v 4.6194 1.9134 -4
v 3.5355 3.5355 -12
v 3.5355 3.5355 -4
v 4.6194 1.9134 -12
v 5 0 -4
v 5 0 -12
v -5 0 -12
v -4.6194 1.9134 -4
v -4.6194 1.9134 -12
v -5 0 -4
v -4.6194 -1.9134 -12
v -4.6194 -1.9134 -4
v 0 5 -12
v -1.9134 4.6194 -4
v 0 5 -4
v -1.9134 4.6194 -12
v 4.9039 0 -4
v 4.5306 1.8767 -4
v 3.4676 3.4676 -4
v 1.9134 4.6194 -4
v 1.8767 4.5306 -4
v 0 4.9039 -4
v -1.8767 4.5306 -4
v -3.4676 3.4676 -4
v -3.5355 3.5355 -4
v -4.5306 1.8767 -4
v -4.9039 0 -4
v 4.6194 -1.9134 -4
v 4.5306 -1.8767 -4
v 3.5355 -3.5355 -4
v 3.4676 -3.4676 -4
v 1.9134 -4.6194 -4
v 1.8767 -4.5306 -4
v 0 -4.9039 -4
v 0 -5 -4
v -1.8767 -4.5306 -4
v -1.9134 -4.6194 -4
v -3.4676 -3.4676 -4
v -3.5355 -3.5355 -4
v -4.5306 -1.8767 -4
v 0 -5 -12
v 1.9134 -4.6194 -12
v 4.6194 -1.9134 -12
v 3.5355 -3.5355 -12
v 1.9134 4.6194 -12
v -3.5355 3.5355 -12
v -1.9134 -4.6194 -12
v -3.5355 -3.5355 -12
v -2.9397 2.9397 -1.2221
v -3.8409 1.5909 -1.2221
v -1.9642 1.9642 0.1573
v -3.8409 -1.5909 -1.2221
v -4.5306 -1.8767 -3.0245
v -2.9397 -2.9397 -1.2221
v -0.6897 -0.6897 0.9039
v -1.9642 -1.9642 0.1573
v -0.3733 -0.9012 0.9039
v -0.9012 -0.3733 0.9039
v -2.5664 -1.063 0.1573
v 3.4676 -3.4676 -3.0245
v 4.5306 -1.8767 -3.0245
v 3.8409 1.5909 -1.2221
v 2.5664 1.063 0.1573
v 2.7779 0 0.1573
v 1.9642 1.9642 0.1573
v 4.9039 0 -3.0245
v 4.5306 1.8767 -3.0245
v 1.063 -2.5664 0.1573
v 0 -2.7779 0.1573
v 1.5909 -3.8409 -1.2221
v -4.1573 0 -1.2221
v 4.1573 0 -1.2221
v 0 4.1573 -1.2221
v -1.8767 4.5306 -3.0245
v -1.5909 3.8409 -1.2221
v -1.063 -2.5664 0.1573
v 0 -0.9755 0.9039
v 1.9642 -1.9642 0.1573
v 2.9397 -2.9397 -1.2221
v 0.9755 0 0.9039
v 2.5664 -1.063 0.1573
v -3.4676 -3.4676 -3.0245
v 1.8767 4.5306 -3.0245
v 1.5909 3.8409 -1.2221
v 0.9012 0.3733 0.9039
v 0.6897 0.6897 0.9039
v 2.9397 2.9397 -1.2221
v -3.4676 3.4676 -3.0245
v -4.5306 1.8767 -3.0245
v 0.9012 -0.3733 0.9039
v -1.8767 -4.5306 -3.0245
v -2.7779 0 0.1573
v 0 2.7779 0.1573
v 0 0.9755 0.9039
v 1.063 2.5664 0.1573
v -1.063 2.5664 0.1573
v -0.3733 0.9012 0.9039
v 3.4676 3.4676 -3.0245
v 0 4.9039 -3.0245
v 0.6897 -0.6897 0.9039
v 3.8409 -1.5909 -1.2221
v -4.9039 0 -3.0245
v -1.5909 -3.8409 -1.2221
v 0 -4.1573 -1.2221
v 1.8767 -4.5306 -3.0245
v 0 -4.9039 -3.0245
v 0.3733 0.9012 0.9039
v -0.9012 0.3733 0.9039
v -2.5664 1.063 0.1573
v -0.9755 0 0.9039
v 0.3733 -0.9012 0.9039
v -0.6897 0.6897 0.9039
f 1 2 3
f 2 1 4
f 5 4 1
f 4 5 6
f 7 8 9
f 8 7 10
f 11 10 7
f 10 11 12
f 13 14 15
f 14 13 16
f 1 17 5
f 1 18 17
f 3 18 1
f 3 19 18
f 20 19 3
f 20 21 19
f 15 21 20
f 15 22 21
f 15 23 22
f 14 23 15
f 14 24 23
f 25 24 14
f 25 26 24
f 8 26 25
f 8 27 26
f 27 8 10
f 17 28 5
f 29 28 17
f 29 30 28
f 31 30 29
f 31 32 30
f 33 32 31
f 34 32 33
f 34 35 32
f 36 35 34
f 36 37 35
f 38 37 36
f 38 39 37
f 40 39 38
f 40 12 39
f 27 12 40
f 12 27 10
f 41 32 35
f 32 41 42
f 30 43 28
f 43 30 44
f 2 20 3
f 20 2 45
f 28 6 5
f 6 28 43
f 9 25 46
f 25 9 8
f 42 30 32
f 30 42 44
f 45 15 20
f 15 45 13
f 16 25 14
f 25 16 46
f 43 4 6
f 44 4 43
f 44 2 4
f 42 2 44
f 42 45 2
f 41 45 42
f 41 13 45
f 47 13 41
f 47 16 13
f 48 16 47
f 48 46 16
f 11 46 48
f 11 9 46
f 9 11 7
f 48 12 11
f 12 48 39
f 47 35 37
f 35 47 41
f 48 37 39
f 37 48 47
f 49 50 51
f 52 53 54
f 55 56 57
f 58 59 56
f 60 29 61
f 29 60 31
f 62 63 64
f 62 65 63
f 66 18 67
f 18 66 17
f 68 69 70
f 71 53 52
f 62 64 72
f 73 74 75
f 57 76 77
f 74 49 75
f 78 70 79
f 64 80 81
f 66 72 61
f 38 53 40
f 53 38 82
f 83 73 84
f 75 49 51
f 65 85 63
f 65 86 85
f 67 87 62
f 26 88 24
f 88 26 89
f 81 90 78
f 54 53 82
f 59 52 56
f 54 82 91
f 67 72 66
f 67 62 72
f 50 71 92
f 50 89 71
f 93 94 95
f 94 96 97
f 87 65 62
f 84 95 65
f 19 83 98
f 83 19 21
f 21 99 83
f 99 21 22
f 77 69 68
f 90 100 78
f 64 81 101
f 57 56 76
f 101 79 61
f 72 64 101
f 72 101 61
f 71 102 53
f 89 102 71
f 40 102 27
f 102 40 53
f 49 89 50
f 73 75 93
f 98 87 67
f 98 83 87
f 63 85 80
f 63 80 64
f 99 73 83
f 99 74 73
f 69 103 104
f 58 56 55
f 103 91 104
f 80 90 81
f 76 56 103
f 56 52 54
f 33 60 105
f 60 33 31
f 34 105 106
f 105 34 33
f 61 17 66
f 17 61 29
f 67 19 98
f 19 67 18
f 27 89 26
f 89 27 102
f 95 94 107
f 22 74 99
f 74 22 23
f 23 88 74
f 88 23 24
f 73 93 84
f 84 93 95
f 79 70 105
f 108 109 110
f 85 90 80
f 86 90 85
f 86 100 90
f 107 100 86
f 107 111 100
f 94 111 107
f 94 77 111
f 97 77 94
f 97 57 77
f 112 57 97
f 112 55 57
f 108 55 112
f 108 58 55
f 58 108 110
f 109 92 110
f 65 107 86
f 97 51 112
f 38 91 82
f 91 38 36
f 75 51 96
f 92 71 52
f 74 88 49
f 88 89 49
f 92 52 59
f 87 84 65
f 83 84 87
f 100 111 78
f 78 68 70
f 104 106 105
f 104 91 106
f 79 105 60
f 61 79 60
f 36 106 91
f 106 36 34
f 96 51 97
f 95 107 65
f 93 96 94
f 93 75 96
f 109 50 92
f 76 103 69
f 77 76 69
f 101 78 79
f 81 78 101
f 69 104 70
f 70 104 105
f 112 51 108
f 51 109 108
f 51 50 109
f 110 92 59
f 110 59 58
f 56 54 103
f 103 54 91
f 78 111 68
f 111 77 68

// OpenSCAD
scope_dia = 55;
led_dia = 10;
//$fn = 50;

//difference(){
//    cylinder(d=scope_dia + 6 * led_dia, h=30, center=true);
//    cylinder(d=scope_dia, h=31, center=true);
//}

// led
translate([0, 0, -8]) {
	cylinder(d=led_dia, h=led_dia-2, center=true);
	translate([0, 0, 4]) {
		sphere(d=led_dia);
	}
}

%cylinder(d2=led_dia*3, d1=led_dia, h=16, center=true);
